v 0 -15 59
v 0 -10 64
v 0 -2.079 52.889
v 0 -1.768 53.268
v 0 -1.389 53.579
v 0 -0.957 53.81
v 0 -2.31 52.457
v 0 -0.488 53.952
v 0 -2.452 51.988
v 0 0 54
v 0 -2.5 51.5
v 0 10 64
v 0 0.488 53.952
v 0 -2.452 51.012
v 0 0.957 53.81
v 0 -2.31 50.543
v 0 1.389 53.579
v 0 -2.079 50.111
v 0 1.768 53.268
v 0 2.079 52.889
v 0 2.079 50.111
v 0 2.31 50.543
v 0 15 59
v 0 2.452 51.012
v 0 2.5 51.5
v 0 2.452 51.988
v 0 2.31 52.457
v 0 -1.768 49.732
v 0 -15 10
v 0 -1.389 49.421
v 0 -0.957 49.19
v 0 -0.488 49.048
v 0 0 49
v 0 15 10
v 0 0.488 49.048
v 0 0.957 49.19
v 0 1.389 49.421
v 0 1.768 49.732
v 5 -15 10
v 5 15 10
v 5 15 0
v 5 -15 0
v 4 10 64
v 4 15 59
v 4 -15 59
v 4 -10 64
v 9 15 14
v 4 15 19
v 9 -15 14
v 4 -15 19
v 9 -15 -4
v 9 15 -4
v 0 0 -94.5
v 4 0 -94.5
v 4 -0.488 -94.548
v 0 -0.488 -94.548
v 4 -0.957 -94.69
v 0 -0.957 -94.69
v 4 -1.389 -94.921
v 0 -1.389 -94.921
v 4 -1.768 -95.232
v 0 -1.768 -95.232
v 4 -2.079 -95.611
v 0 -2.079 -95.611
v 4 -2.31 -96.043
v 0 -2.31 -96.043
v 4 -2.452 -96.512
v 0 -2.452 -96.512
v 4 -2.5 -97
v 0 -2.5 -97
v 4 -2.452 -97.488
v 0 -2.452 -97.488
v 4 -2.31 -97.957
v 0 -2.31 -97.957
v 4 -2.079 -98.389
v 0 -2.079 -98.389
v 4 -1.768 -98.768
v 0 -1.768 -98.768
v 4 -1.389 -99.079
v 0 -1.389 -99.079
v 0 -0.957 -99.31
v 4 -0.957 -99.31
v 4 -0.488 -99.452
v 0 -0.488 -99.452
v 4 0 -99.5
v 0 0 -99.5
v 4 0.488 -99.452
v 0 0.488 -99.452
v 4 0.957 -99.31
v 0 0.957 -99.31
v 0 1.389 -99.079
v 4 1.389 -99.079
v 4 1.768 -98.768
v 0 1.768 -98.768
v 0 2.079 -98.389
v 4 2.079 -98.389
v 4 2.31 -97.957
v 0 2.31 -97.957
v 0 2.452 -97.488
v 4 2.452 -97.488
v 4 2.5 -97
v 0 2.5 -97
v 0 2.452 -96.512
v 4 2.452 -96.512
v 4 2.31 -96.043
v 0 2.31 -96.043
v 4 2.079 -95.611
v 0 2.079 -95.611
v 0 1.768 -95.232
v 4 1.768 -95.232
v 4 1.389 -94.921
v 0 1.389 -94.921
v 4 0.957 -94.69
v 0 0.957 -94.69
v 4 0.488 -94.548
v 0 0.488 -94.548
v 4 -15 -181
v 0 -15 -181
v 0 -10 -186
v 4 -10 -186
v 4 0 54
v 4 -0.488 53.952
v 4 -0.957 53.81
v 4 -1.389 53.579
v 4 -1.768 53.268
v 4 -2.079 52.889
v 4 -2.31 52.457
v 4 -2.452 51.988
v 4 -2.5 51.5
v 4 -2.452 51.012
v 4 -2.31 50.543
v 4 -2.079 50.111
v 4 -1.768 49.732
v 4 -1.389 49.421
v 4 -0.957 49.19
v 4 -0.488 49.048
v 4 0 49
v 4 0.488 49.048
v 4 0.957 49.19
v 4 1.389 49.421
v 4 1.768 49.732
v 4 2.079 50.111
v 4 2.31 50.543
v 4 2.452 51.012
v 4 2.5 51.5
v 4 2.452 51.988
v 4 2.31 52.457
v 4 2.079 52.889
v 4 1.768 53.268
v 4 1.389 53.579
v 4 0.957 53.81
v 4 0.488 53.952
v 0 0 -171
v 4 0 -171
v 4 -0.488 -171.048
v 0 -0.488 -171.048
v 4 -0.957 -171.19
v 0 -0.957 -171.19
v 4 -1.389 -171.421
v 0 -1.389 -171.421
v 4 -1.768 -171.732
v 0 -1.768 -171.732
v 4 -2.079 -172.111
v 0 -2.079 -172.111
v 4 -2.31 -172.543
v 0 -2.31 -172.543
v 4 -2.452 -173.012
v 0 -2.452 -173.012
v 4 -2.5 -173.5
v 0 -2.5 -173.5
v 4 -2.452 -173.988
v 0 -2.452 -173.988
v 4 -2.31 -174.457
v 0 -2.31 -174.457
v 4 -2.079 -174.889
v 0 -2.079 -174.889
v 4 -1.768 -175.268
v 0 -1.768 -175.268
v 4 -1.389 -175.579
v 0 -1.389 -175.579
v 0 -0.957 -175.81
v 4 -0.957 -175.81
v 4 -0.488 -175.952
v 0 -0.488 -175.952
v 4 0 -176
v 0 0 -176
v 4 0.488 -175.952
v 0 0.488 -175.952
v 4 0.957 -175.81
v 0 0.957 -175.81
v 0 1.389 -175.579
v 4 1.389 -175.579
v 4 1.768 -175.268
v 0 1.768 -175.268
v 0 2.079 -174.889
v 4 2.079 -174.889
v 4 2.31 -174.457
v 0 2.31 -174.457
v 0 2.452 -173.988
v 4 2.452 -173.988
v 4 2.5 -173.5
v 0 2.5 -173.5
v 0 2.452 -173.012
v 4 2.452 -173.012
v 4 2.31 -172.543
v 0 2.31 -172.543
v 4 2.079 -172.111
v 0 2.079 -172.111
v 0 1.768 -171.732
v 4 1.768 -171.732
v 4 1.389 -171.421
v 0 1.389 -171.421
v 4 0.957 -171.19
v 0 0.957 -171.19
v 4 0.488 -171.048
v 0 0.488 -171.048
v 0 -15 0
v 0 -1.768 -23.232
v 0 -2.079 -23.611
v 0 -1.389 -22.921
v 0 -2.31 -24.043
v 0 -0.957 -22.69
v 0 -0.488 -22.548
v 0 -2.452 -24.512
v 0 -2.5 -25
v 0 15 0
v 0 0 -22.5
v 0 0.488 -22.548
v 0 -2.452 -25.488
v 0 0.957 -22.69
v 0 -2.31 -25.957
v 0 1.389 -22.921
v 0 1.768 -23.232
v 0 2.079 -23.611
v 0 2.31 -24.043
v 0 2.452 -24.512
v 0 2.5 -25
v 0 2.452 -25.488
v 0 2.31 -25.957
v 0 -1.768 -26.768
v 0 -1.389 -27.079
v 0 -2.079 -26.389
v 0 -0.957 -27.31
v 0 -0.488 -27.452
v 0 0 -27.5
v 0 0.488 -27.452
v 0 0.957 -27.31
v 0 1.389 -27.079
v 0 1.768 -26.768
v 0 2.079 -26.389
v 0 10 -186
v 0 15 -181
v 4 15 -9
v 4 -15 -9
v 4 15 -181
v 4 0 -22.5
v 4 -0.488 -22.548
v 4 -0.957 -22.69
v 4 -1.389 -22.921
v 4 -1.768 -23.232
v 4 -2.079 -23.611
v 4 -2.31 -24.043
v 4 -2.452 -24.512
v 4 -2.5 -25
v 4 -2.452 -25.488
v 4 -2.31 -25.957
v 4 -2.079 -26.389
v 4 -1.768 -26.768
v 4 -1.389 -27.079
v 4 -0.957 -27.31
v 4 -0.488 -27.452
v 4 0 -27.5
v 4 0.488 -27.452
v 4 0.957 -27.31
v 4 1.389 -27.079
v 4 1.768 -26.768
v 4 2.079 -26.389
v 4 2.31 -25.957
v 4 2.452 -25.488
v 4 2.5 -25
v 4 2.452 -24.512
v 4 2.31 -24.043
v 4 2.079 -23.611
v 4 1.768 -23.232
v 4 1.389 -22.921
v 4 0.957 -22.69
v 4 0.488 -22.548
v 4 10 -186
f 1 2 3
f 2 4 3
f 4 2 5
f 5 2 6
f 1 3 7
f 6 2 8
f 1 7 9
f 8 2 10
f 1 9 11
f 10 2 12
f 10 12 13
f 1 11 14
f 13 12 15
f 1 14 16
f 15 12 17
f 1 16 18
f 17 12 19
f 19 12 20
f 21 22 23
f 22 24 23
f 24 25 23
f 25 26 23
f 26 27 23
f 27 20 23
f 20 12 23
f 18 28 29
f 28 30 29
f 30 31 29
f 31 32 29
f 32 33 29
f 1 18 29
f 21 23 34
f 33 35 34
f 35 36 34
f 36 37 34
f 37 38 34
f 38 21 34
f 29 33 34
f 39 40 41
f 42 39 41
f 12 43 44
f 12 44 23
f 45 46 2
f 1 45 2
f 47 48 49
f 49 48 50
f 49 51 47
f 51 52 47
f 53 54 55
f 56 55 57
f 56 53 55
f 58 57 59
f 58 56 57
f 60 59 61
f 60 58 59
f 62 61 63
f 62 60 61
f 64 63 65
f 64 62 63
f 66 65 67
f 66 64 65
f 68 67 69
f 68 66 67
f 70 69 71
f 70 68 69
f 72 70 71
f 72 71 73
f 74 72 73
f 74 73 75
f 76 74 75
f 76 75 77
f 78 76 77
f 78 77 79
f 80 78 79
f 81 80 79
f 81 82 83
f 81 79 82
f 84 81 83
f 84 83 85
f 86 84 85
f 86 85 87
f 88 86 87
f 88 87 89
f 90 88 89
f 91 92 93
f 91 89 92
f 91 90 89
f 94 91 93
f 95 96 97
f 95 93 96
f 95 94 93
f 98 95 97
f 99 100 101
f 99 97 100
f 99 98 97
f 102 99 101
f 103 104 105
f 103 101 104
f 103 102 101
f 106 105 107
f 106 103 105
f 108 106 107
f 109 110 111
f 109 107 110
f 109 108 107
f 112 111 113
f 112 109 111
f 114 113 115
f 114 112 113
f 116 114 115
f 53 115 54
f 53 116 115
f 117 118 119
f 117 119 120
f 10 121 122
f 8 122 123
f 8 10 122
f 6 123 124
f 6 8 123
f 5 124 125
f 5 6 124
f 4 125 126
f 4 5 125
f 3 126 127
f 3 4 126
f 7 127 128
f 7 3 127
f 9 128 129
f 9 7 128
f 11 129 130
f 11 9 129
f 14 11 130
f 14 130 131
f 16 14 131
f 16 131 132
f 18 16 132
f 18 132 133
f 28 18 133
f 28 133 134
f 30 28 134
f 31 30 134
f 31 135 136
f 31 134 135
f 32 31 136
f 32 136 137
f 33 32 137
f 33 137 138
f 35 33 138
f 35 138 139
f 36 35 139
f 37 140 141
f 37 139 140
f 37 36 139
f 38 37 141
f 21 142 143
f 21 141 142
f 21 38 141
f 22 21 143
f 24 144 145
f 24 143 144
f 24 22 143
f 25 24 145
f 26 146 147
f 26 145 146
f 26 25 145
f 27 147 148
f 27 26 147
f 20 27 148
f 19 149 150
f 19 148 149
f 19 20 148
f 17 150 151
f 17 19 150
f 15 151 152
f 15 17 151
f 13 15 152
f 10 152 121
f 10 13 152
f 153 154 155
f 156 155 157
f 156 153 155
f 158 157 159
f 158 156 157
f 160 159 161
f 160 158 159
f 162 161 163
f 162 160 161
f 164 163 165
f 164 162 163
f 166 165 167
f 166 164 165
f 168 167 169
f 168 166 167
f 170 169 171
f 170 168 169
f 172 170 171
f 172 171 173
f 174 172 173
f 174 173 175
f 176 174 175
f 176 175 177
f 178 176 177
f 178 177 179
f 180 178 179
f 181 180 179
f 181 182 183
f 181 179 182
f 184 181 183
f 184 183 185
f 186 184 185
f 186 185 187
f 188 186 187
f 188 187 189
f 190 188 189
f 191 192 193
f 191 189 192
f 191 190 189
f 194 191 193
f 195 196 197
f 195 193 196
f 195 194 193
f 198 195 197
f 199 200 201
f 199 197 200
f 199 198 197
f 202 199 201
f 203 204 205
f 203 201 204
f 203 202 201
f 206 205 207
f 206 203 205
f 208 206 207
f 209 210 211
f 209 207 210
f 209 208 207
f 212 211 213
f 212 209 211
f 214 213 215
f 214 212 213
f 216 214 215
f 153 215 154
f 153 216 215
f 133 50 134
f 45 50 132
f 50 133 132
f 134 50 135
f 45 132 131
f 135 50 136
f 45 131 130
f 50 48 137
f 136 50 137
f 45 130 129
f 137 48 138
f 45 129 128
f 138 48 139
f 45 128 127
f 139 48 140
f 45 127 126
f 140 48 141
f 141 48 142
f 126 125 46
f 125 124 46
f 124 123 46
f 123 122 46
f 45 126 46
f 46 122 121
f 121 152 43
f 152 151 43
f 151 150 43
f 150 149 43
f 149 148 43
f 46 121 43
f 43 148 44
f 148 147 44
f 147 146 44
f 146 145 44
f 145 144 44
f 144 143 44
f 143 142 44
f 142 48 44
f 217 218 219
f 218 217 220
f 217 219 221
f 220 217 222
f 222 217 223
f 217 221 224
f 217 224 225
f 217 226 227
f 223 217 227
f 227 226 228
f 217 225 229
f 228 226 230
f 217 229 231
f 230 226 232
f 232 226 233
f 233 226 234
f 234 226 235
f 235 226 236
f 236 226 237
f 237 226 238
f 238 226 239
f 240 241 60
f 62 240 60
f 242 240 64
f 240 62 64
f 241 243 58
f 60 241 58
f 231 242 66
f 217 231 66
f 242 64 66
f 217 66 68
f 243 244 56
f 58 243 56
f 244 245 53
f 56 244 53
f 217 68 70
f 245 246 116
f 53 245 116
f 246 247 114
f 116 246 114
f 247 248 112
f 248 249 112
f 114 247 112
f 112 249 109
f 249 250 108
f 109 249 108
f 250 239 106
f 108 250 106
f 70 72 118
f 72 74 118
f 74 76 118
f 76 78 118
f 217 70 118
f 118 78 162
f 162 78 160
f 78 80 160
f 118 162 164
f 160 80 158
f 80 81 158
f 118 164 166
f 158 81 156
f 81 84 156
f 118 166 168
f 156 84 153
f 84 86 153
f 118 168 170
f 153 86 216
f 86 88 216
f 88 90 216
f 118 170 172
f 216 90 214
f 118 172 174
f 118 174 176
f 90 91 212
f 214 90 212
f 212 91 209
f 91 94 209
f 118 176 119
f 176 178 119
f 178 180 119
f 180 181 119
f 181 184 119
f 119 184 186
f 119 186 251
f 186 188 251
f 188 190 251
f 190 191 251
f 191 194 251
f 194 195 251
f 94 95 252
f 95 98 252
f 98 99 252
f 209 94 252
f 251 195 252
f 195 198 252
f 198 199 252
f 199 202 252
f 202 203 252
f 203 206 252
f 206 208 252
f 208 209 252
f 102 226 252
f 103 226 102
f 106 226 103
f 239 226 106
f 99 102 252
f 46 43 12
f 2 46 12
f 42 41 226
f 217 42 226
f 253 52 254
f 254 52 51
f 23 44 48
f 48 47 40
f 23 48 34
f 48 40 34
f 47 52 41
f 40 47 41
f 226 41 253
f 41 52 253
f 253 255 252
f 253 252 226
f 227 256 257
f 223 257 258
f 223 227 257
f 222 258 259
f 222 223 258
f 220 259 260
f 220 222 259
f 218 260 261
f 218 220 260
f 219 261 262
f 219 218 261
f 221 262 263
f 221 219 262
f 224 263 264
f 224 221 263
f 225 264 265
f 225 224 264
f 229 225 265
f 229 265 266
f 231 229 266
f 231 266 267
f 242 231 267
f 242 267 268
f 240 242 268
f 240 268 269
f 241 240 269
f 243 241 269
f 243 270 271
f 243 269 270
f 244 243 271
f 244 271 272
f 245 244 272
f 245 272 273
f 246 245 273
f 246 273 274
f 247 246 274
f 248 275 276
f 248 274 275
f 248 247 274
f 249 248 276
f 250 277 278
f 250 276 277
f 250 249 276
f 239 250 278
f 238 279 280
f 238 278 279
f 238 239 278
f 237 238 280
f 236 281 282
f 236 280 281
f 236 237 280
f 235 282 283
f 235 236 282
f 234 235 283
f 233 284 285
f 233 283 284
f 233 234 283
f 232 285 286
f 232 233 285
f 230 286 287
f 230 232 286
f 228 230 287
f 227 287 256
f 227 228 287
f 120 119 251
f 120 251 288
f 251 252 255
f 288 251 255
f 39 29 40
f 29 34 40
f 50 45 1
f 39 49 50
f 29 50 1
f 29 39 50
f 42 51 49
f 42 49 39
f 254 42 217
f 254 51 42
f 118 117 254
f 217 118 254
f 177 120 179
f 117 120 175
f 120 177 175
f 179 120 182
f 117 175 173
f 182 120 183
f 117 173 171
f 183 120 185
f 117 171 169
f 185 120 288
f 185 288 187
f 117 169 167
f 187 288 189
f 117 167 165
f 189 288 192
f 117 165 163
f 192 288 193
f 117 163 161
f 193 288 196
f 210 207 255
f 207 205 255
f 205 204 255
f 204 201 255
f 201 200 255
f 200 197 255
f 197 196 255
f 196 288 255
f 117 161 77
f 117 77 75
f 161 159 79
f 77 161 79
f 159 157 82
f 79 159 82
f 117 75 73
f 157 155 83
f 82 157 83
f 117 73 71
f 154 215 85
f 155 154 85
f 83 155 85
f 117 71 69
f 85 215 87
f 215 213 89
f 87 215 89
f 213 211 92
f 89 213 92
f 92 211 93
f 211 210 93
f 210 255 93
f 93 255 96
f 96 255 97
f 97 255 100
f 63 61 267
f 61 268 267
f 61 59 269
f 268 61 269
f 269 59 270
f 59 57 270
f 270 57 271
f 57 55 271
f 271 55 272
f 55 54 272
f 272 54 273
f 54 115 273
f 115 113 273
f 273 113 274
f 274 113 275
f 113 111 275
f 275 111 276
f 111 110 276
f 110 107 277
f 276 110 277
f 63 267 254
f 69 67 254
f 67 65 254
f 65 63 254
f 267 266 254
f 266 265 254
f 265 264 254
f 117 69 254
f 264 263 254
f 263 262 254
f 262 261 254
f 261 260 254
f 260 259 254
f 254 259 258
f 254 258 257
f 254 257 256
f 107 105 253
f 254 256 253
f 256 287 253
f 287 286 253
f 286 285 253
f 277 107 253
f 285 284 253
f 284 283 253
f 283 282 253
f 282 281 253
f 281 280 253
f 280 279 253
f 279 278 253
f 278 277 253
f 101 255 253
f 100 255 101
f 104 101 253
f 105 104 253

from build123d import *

# Parameters (mm, degrees)
SALIENTE_EXTRUIR1_DEPTH = 15
CROQUIS2_R              = 2.5
CORTAR_EXTRUIR2_DEPTH   = 30
CHAFL_N1_SIZE           = 5


with BuildPart() as part:
    # Croquis1 → Saliente-Extruir1 (new, symmetric)
    with BuildSketch(Plane(origin=(0, 0, 0), x_dir=(1, 0, 0), z_dir=(0, 1, 0))):
        Polygon((0, 0), (0, 186), (4, 186), (4, 4), (9, 4), (9, -14), (4, -14), (4, -64), (0, -64), (0, -10), (5, -10), (5, 0), align=None)
    extrude(amount=SALIENTE_EXTRUIR1_DEPTH, both=True)

    # Croquis2 → Cortar-Extruir2 (cut)
    with BuildSketch(Plane(origin=(0, 0, 0), x_dir=(0, 0, -1), z_dir=(1, 0, 0))):
        with Locations(Location((-51.5, 0, 0), (0, 0, 180))):
            Circle(CROQUIS2_R)
        with Locations(Location((25, 0, 0), (0, 0, 180))):
            Circle(CROQUIS2_R)
        with Locations(Location((97, 0, 0), (0, 0, 180))):
            Circle(CROQUIS2_R)
        with Locations(Location((173.5, 0, 0), (0, 0, 180))):
            Circle(CROQUIS2_R)
    extrude(amount=CORTAR_EXTRUIR2_DEPTH, mode=Mode.SUBTRACT)

    # Chaflán1
    chafl_n1_edges = [part.edges().sort_by_distance(p)[0] for p in [
        (2, -15, -186),
        (2, 15, -186),
        (2, -15, 64),
        (2, 15, 64),
        (4, 0, -4),
        (4, 0, 14),
    ]]
    chamfer(chafl_n1_edges, length=CHAFL_N1_SIZE - 0.0001)  # a hair under: the kernel refuses the full size


solid = part.part
